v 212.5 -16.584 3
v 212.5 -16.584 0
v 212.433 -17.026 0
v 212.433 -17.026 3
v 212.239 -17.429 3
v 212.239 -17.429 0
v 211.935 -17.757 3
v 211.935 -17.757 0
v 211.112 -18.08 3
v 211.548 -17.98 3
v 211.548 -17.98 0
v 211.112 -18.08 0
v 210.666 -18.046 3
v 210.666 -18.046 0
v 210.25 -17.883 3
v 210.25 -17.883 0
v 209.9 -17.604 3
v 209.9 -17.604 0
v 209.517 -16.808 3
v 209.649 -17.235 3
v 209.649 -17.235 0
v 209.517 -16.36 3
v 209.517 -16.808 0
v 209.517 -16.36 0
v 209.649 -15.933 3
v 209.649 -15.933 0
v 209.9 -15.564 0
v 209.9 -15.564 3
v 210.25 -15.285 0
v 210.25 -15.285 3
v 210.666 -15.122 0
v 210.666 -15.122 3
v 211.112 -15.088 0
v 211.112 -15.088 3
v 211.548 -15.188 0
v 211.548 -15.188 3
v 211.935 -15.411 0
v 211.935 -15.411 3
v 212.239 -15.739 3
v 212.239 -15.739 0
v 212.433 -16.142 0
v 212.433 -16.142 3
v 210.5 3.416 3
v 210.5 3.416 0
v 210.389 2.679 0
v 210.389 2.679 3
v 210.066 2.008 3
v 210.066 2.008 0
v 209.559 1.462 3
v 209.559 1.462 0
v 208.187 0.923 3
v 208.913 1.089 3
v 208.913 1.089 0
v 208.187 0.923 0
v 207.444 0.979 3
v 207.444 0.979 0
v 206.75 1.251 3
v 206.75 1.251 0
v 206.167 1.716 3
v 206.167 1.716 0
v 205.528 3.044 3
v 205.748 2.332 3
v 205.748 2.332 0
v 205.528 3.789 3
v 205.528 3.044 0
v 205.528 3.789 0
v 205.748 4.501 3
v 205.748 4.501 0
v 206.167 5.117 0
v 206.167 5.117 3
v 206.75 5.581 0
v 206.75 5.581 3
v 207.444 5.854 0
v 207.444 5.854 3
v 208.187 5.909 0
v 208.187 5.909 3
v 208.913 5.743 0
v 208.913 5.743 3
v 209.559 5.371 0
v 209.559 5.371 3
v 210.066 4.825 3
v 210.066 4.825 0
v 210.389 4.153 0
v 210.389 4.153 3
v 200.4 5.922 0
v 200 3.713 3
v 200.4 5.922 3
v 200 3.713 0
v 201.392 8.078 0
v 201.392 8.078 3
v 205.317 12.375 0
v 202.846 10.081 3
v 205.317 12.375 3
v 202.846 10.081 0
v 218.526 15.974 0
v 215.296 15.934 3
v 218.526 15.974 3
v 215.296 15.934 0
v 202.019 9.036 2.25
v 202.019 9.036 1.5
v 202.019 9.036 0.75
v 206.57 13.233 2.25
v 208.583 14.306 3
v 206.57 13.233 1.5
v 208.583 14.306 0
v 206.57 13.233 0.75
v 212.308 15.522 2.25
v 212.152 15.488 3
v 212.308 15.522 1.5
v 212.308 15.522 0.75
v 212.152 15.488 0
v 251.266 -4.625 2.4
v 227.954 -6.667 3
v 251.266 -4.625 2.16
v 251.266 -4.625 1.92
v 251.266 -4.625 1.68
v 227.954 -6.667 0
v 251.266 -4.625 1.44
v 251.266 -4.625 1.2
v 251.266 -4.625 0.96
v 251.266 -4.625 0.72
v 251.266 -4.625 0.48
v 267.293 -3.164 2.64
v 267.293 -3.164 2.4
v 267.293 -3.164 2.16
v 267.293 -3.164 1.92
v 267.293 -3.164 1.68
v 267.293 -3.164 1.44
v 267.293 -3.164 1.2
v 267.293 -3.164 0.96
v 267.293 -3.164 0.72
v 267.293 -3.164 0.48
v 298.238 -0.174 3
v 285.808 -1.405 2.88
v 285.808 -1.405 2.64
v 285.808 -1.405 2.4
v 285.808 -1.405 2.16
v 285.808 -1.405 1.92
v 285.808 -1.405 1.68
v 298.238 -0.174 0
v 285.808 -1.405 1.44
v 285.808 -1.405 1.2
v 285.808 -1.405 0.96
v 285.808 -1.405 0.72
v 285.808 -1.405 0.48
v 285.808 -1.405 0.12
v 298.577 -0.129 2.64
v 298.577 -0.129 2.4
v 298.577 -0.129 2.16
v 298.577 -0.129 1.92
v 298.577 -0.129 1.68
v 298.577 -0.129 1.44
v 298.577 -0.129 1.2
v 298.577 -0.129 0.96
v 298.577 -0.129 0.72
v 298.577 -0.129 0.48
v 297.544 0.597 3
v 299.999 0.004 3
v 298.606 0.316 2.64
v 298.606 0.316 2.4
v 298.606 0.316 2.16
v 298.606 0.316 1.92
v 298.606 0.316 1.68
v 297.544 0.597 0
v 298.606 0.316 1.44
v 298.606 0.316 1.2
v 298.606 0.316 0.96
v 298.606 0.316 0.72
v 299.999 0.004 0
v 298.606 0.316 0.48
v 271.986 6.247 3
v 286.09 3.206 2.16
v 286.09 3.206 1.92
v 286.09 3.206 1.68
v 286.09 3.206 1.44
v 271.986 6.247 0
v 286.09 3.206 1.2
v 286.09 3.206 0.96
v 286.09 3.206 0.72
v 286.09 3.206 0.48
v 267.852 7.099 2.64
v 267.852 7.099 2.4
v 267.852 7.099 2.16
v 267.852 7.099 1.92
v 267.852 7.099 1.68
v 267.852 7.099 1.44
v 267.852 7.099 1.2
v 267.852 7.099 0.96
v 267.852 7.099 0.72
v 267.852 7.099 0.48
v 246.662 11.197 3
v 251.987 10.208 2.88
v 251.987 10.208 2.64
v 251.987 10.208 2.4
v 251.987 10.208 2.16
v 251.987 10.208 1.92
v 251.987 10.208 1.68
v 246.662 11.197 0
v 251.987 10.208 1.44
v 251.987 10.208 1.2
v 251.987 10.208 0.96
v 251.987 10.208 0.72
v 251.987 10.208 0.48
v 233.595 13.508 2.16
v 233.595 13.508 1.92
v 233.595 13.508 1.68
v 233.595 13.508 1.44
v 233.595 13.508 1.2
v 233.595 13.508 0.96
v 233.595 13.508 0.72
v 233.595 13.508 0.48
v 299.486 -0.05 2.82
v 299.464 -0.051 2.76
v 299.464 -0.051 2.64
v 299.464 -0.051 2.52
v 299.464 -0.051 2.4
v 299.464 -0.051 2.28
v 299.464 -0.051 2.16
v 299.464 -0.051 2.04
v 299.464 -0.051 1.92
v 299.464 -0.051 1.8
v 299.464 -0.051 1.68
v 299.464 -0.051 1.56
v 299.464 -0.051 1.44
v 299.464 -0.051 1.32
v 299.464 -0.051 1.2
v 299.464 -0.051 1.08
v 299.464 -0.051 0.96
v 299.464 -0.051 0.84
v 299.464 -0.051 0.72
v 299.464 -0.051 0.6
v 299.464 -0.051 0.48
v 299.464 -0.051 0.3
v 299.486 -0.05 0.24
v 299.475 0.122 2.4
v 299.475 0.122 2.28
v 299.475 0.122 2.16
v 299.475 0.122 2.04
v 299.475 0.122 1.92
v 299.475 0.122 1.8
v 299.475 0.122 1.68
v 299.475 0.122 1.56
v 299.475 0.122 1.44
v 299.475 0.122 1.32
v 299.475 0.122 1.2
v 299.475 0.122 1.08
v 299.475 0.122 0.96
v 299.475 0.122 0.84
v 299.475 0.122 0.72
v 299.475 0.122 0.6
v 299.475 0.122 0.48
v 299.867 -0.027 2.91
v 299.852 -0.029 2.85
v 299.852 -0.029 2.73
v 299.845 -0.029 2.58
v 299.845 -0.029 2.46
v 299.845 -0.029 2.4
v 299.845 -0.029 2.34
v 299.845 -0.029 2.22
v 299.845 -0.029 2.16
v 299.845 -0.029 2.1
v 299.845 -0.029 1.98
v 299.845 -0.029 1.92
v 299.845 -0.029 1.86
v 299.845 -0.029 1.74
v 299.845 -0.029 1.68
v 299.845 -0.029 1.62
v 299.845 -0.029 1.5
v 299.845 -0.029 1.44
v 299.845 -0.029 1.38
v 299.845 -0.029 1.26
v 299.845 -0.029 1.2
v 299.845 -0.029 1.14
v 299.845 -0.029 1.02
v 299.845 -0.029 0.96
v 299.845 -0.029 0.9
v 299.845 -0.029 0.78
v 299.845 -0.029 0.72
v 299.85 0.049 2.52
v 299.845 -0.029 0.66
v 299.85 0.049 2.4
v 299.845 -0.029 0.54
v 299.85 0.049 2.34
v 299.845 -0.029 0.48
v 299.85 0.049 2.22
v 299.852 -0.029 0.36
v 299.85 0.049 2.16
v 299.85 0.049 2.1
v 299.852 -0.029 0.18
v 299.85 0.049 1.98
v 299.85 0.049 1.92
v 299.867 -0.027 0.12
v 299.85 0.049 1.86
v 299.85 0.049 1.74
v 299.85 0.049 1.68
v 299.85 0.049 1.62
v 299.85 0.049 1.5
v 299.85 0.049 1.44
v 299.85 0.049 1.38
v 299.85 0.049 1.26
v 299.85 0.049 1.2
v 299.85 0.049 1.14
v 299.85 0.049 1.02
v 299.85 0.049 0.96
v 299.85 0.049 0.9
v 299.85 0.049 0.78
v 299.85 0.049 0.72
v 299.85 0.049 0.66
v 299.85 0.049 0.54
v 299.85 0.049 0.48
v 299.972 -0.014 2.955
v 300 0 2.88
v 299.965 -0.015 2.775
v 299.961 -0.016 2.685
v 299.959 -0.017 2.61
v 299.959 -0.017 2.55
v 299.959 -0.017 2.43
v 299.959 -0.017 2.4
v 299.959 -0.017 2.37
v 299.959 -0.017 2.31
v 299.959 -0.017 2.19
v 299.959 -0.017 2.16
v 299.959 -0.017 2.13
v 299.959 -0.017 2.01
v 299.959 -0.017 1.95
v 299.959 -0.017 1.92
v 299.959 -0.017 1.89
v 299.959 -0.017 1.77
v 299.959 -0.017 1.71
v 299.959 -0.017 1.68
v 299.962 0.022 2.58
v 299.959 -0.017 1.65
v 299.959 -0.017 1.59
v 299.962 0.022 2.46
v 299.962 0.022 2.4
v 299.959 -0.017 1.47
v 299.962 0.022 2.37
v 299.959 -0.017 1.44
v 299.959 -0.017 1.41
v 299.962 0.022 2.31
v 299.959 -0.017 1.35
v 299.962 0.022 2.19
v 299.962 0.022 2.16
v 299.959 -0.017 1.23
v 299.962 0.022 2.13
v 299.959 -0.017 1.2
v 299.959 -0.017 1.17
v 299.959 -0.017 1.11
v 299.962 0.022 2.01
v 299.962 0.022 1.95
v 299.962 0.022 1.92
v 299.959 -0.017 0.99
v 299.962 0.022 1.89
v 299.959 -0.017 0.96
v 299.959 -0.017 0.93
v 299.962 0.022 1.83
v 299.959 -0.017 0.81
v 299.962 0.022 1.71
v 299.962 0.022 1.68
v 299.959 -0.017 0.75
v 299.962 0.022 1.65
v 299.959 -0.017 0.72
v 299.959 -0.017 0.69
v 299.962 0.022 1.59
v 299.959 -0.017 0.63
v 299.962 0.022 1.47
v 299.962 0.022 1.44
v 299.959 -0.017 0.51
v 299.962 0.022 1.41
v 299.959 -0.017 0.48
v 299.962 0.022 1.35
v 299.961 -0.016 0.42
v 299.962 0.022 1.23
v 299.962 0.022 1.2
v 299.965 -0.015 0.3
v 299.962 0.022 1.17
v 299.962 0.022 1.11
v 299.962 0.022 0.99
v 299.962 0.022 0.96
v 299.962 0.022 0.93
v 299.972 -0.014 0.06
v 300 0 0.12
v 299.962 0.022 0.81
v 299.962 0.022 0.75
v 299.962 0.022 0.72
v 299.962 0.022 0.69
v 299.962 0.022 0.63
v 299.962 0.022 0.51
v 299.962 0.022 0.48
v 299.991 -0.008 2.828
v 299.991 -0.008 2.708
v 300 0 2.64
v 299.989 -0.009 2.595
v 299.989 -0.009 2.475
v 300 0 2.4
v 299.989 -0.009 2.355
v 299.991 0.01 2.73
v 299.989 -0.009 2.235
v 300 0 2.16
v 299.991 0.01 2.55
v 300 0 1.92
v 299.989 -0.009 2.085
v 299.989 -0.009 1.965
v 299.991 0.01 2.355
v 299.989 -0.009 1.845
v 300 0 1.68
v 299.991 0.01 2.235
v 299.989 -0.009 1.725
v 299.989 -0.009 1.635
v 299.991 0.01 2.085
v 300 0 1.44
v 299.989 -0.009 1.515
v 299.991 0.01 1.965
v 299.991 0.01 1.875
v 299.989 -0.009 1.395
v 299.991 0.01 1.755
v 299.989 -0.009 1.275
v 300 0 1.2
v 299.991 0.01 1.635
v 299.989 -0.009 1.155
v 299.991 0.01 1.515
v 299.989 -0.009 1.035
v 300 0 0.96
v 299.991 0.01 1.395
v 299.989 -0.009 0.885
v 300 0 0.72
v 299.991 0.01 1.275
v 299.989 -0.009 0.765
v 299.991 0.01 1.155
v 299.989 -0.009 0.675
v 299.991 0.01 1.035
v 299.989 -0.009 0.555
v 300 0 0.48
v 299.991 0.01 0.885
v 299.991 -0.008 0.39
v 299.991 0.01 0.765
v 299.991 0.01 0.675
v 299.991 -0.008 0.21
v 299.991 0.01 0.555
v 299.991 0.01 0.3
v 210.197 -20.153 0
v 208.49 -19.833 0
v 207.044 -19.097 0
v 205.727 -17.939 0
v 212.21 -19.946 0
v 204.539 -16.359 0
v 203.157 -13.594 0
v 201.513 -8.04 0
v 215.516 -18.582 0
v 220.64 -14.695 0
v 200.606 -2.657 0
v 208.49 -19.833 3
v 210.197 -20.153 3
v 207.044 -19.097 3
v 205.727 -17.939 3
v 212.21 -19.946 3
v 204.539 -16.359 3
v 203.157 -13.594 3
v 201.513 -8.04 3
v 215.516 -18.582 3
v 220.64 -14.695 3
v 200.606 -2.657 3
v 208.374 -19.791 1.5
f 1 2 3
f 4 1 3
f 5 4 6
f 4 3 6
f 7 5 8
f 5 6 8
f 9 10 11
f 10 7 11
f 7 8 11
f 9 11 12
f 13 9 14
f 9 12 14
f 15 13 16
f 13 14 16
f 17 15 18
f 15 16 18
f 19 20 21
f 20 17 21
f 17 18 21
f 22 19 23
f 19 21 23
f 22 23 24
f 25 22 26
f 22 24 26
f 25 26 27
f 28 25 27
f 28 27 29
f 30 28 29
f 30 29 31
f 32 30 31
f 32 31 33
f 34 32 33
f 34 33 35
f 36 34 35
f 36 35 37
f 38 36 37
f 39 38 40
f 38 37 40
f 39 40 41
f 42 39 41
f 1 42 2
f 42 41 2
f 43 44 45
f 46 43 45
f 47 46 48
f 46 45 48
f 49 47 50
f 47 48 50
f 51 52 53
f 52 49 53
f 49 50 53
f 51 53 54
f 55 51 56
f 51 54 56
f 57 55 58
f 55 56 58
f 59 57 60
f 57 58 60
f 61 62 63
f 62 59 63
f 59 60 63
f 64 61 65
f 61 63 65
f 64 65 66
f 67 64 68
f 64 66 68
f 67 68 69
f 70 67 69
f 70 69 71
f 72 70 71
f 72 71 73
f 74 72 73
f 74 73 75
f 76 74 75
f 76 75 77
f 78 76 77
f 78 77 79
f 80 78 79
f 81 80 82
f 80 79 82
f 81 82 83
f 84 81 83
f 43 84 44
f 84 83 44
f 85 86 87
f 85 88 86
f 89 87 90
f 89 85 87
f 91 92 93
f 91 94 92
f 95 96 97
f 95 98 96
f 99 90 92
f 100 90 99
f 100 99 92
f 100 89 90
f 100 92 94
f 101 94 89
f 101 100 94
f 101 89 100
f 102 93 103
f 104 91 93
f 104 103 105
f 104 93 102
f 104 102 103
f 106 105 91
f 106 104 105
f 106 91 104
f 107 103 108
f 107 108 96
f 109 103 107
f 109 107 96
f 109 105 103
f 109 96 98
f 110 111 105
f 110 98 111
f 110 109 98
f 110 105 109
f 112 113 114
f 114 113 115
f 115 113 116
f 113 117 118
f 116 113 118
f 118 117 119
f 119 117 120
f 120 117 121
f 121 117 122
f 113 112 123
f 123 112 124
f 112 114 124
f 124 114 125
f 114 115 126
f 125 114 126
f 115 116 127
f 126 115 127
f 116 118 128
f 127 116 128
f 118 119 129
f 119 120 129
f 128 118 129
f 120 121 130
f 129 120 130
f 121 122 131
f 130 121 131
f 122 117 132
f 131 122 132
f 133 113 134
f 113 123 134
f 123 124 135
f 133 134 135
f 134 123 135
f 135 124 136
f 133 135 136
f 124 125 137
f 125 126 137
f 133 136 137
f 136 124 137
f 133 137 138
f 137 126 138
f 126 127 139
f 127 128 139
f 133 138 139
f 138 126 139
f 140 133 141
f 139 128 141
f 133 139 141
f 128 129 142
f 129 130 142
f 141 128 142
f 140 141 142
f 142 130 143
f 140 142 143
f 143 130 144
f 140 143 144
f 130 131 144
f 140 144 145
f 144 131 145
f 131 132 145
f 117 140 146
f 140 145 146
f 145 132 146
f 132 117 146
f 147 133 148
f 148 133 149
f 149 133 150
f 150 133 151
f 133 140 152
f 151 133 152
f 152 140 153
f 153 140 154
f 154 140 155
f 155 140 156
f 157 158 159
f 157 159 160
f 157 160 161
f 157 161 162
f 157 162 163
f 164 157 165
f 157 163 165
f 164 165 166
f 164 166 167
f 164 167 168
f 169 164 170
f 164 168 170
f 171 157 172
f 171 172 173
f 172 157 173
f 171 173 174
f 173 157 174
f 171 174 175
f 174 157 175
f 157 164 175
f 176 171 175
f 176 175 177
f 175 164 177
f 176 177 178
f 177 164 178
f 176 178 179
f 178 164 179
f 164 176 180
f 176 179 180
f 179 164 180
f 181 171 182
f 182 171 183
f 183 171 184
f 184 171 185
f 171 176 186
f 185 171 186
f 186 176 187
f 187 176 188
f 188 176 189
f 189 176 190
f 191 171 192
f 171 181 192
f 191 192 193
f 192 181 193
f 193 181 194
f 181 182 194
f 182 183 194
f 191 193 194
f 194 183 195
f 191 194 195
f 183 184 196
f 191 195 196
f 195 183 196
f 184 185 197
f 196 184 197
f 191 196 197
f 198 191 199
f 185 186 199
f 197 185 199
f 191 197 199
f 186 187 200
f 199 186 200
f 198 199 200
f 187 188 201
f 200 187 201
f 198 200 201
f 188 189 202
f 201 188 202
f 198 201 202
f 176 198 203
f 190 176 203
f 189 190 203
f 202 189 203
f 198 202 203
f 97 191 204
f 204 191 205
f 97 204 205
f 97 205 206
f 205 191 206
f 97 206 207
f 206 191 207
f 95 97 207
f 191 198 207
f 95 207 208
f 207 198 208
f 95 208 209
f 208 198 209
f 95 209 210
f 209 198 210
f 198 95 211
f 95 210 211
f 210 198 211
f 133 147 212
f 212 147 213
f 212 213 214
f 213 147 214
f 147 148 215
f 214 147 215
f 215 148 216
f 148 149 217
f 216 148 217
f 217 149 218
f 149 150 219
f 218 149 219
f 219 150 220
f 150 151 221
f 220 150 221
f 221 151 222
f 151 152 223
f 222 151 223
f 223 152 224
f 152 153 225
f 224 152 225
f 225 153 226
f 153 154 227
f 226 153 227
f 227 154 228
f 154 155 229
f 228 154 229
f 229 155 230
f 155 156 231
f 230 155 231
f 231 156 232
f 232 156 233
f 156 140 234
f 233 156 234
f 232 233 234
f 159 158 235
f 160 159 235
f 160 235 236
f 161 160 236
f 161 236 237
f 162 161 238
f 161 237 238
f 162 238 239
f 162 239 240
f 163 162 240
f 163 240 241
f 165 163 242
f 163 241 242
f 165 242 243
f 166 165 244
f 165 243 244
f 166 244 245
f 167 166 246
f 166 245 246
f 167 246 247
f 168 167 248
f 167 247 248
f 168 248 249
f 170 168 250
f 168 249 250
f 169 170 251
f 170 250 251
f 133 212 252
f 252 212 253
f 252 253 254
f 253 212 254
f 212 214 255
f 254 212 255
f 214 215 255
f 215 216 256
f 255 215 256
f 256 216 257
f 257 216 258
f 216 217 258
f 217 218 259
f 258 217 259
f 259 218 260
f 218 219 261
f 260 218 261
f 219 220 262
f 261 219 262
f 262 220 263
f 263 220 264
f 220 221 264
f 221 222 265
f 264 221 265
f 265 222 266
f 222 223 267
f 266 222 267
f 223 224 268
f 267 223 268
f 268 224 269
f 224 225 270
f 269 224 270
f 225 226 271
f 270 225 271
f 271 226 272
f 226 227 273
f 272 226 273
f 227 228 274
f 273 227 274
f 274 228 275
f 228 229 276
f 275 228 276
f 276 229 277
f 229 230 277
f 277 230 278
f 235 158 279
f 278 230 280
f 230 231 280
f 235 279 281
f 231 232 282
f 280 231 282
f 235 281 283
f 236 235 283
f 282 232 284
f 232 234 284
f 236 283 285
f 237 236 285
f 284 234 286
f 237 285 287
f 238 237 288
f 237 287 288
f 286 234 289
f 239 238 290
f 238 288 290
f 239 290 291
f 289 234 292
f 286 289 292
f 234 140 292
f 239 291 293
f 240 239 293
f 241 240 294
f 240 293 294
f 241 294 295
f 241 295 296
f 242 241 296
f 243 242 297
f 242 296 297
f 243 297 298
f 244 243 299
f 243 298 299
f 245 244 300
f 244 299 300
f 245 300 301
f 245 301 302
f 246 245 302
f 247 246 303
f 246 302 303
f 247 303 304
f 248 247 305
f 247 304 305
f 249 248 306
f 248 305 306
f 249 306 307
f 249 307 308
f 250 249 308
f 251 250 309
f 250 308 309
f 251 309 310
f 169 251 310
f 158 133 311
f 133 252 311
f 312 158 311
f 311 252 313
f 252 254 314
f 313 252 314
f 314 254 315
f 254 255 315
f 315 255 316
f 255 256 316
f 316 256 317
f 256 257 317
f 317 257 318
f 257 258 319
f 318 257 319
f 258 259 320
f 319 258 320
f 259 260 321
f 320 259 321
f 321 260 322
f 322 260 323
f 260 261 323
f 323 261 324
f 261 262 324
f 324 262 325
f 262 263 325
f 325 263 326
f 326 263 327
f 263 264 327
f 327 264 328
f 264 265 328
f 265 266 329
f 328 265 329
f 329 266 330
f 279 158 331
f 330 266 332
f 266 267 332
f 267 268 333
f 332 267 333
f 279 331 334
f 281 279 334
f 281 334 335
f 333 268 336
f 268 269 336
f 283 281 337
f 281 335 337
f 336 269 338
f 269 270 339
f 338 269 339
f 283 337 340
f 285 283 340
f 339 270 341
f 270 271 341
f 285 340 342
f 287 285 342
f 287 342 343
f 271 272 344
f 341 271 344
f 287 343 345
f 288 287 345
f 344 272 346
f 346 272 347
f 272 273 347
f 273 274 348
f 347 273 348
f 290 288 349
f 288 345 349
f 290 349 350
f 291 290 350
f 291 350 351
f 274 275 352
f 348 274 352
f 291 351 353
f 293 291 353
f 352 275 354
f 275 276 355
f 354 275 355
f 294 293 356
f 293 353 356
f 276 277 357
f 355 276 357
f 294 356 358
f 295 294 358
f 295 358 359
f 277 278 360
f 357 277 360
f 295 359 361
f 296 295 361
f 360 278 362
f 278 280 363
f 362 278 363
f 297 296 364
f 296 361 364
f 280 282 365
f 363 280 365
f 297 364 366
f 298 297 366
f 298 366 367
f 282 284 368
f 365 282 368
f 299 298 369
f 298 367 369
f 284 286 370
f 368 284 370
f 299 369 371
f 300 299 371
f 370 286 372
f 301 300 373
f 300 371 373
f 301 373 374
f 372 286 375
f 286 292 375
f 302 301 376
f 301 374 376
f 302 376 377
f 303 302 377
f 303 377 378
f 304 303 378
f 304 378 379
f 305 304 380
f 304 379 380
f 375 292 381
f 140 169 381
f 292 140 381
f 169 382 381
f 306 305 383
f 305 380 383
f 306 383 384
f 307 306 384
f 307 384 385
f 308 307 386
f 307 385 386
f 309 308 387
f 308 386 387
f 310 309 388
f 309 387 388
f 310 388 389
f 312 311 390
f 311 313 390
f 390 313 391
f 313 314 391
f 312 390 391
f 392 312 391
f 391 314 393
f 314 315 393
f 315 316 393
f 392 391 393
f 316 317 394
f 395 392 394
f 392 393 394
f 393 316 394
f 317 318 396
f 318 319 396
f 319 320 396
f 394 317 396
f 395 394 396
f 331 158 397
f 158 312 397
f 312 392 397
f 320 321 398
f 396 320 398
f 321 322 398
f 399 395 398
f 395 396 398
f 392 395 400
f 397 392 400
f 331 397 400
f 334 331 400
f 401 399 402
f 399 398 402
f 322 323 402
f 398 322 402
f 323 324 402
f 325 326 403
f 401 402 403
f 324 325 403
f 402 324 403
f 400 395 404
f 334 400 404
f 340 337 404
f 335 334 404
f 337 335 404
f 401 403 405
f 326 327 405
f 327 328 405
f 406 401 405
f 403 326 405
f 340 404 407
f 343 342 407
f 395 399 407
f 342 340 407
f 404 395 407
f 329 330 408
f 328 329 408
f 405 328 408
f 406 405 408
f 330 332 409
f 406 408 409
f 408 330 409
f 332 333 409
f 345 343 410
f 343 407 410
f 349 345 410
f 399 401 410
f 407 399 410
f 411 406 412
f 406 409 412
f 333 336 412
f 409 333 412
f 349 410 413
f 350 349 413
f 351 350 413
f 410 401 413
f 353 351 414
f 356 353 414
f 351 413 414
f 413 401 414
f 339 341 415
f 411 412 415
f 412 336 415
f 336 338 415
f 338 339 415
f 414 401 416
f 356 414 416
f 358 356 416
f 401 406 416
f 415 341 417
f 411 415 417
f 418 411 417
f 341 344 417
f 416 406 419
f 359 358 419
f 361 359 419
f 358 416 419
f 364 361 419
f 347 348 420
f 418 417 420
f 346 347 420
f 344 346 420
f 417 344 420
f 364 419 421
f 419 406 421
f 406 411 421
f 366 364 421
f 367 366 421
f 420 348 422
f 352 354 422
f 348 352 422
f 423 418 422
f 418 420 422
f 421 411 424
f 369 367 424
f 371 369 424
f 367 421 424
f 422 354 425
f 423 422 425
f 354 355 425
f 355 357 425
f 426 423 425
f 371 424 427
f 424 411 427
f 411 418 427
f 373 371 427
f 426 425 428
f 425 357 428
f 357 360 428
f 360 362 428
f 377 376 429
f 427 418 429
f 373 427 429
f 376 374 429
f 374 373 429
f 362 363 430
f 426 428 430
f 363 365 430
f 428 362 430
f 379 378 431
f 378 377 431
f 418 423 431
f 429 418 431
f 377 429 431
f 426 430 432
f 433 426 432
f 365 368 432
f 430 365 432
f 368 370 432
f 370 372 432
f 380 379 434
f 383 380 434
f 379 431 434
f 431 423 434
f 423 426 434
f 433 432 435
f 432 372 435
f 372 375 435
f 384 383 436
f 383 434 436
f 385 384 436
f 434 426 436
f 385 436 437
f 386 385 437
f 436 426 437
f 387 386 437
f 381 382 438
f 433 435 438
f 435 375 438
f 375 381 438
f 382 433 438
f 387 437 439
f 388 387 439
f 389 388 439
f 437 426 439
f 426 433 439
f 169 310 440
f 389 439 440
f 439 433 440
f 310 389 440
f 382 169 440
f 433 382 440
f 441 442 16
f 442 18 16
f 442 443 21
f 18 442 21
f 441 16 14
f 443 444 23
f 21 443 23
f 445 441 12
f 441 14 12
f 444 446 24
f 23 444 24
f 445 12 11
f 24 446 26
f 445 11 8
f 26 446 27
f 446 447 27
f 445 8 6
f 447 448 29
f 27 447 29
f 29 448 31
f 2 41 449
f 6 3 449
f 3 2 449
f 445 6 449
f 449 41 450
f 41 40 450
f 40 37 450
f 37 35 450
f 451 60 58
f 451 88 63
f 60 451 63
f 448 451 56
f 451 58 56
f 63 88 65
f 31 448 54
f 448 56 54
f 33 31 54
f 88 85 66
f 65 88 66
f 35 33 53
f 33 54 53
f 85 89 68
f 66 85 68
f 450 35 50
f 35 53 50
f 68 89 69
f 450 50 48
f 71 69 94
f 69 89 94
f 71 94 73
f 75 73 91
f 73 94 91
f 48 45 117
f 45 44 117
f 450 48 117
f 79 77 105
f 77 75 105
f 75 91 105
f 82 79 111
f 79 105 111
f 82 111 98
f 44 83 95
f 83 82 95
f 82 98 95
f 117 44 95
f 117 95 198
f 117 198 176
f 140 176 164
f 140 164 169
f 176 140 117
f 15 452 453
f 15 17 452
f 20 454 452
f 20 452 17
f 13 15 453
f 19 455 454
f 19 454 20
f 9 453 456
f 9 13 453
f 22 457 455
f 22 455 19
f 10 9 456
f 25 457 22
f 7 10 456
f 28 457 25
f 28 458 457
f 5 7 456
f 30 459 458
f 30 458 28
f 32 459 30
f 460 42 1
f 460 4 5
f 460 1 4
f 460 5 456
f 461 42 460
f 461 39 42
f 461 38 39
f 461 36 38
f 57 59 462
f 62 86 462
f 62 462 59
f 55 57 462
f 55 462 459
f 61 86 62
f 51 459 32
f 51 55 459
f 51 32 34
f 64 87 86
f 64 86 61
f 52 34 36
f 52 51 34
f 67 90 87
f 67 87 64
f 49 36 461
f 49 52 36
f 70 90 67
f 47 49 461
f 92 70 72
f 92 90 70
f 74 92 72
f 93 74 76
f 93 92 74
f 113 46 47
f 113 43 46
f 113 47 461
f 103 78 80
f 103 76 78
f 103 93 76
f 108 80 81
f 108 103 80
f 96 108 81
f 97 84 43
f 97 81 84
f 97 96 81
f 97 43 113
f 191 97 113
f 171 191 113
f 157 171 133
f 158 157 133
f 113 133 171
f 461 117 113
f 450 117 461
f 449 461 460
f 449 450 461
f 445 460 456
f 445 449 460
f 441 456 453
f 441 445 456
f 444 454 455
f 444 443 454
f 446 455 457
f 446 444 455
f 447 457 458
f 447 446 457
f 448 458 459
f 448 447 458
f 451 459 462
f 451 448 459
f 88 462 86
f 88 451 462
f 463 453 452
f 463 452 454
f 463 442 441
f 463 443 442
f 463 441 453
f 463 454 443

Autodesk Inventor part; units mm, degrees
ref_plane "YZ Plane" through (0, 0, 0) normal (1, 0, 0) x (0, 1, 0)
ref_plane "XZ Plane" through (0, 0, 0) normal (0, 1, 0) x (-1, 0, 0)
ref_plane "XY Plane" through (0, 0, 0) normal (0, 0, 1) x (1, 0, 0)
sketch "Sketch1" plane through (0, 0, 0) normal (0, 0, 1) x (1, 0, 0)
  spline S0 degree 4 poles (227.9538, -6.6666) (233.9795, -6.1502) (242.1312, -5.4418) (252.1108, -4.5554) (263.3906, -3.5266) (270.7075, -2.8494) (277.2598, -2.2283) (283.0709, -1.6797) (287.955, -1.1879) (292.1861, -0.8066) (295.1251, -0.4496) (297.859, -0.2789) (298.9117, -0.0313) (300.6417, -0.0427) (298.9253, 0.1752) (297.9143, 0.5599) (295.2242, 1.0851) (292.3531, 1.8178) (288.198, 2.7284) (283.4022, 3.8159) (277.6828, 5.0504) (271.2241, 6.4164) (263.9961, 7.8887) (256.0707, 9.4454) (247.4873, 11.0611) (237.0929, 12.9289) (228.6426, 14.3598) (222.3187, 15.3801) (218.5257, 15.9738) knots 0 0 0 0 0 0.123617 0.170541 0.215522 0.258317 0.298656 0.336232 0.370677 0.401524 0.428109 0.449222 0.465805 0.481001 0.497585 0.518702 0.545296 0.576159 0.61063 0.648244 0.688637 0.731505 0.776579 0.823621 0.872406 0.922727 1 1 1 1 1
  line L0 (200, 103) -> (200, -97) construction
  line L1 (300, -103) -> (300, 103) construction
  line L2 (200, 3.7134) -> (300, 0) construction
  circle A0 centre (225, 2.7851) radius 2.5 construction
  line L3 (230.0222, 14.1744) -> (207.0292, 17.7732) construction
  arc A1 (227.7164, 14.4946) -> (209.3226, 17.3735) centre (52.1769, -1046.8526) ccw construction
  spline S1 degree 4 poles (200, 3.7134) (200.1426, 9.1224) (206.2423, 15.1239) (212.1443, 16.2028) (218.5257, 15.9738) knots 0 0 0 0 0 1 1 1 1 1
  line L4 (212.7843, 16.1798) -> (224.2671, 15.7678) construction
  arc A2 (223.0845, 15.568) -> (213.9496, 15.8959) centre (216.9735, -27.2787) ccw construction
  line L5 (199.8716, -1.156) -> (200.1284, 8.5828) construction
  arc A3 (201.0052, 7.043) -> (200.8284, 0.3354) centre (206.5929, 3.5396) ccw construction
  spline S2 degree 2 poles (227.9538, -6.6666) (202.7705, -38.1054) (200, 3.7134) knots 0 0 0 1 1 1
  circle A4 centre (211, -16.584) radius 1.5
  line L6 (197, -35.9531) -> (225, 2.7851) construction
  circle A5 centre (208, 3.4163) radius 2.5
  point P0 (299.5428, 0.1089)
  point P1 (298.1739, 0.4338)
  point P2 (295.9008, 0.9681)
  point P3 (292.7367, 1.7025)
  point P4 (288.6996, 2.6229)
  point P5 (283.8129, 3.7134)
  point P6 (278.1048, 4.9545)
  point P7 (271.6086, 6.3255)
  point P8 (264.3621, 7.8039)
  point P9 (256.4085, 9.3663)
  point P10 (247.7946, 10.9887)
  point P11 (238.572, 12.6468)
  point P12 (228.7959, 14.3166)
  point P13 (207.8235, 17.5944)
  point P14 (247.0398, -5.0019)
  point P15 (255.7236, -4.2234)
  point P16 (263.7597, -3.4905)
  point P17 (271.0965, -2.8098)
  point P18 (277.6872, -2.1882)
  point P19 (283.4889, -1.6323)
  point P20 (288.4641, -1.1487)
  point P21 (292.5804, -0.7434)
  point P22 (295.8102, -0.4221)
  point P23 (298.1328, -0.1887)
  point P24 (299.5323, -0.0474)
  point P25 (208.6203, -19.8763)
  dimension "d17" = 100
  dimension "d22" = 5
  dimension "d23" = 75
  dimension "d36" = 3
  dimension "d37" = 5
  dimension "d38" = 3
sketch "Sketch3" plane through (0, 0, 0) normal (0, 0, 1) x (1, 0, 0)
  point P0 (0, 0)
sketch "Sketch4" plane through (0, 0, 0) normal (0, 0, 1) x (1, 0, 0)
  point P0 (0, 0)
sketch "Sketch5" plane through (0, 0, 0) normal (0, 0, 1) x (1, 0, 0)
  point P0 (0, 0)
sketch "Sketch6" plane through (0, 0, 0) normal (0, 0, 1) x (1, 0, 0)
  point P0 (0, 0)
sketch "Sketch7" plane through (0, 0, 0) normal (0, 0, 1) x (1, 0, 0)
  point P0 (0, 0)
sketch "Sketch8" plane through (0, 0, 0) normal (0, 0, 1) x (1, 0, 0)
  point P0 (0, 0)
extrude "Extrusion2" add sketch "Sketch1" along normal blind 3
properties part number "AIL middle connecting rib extension assembly" material "Plywood, Finish"
